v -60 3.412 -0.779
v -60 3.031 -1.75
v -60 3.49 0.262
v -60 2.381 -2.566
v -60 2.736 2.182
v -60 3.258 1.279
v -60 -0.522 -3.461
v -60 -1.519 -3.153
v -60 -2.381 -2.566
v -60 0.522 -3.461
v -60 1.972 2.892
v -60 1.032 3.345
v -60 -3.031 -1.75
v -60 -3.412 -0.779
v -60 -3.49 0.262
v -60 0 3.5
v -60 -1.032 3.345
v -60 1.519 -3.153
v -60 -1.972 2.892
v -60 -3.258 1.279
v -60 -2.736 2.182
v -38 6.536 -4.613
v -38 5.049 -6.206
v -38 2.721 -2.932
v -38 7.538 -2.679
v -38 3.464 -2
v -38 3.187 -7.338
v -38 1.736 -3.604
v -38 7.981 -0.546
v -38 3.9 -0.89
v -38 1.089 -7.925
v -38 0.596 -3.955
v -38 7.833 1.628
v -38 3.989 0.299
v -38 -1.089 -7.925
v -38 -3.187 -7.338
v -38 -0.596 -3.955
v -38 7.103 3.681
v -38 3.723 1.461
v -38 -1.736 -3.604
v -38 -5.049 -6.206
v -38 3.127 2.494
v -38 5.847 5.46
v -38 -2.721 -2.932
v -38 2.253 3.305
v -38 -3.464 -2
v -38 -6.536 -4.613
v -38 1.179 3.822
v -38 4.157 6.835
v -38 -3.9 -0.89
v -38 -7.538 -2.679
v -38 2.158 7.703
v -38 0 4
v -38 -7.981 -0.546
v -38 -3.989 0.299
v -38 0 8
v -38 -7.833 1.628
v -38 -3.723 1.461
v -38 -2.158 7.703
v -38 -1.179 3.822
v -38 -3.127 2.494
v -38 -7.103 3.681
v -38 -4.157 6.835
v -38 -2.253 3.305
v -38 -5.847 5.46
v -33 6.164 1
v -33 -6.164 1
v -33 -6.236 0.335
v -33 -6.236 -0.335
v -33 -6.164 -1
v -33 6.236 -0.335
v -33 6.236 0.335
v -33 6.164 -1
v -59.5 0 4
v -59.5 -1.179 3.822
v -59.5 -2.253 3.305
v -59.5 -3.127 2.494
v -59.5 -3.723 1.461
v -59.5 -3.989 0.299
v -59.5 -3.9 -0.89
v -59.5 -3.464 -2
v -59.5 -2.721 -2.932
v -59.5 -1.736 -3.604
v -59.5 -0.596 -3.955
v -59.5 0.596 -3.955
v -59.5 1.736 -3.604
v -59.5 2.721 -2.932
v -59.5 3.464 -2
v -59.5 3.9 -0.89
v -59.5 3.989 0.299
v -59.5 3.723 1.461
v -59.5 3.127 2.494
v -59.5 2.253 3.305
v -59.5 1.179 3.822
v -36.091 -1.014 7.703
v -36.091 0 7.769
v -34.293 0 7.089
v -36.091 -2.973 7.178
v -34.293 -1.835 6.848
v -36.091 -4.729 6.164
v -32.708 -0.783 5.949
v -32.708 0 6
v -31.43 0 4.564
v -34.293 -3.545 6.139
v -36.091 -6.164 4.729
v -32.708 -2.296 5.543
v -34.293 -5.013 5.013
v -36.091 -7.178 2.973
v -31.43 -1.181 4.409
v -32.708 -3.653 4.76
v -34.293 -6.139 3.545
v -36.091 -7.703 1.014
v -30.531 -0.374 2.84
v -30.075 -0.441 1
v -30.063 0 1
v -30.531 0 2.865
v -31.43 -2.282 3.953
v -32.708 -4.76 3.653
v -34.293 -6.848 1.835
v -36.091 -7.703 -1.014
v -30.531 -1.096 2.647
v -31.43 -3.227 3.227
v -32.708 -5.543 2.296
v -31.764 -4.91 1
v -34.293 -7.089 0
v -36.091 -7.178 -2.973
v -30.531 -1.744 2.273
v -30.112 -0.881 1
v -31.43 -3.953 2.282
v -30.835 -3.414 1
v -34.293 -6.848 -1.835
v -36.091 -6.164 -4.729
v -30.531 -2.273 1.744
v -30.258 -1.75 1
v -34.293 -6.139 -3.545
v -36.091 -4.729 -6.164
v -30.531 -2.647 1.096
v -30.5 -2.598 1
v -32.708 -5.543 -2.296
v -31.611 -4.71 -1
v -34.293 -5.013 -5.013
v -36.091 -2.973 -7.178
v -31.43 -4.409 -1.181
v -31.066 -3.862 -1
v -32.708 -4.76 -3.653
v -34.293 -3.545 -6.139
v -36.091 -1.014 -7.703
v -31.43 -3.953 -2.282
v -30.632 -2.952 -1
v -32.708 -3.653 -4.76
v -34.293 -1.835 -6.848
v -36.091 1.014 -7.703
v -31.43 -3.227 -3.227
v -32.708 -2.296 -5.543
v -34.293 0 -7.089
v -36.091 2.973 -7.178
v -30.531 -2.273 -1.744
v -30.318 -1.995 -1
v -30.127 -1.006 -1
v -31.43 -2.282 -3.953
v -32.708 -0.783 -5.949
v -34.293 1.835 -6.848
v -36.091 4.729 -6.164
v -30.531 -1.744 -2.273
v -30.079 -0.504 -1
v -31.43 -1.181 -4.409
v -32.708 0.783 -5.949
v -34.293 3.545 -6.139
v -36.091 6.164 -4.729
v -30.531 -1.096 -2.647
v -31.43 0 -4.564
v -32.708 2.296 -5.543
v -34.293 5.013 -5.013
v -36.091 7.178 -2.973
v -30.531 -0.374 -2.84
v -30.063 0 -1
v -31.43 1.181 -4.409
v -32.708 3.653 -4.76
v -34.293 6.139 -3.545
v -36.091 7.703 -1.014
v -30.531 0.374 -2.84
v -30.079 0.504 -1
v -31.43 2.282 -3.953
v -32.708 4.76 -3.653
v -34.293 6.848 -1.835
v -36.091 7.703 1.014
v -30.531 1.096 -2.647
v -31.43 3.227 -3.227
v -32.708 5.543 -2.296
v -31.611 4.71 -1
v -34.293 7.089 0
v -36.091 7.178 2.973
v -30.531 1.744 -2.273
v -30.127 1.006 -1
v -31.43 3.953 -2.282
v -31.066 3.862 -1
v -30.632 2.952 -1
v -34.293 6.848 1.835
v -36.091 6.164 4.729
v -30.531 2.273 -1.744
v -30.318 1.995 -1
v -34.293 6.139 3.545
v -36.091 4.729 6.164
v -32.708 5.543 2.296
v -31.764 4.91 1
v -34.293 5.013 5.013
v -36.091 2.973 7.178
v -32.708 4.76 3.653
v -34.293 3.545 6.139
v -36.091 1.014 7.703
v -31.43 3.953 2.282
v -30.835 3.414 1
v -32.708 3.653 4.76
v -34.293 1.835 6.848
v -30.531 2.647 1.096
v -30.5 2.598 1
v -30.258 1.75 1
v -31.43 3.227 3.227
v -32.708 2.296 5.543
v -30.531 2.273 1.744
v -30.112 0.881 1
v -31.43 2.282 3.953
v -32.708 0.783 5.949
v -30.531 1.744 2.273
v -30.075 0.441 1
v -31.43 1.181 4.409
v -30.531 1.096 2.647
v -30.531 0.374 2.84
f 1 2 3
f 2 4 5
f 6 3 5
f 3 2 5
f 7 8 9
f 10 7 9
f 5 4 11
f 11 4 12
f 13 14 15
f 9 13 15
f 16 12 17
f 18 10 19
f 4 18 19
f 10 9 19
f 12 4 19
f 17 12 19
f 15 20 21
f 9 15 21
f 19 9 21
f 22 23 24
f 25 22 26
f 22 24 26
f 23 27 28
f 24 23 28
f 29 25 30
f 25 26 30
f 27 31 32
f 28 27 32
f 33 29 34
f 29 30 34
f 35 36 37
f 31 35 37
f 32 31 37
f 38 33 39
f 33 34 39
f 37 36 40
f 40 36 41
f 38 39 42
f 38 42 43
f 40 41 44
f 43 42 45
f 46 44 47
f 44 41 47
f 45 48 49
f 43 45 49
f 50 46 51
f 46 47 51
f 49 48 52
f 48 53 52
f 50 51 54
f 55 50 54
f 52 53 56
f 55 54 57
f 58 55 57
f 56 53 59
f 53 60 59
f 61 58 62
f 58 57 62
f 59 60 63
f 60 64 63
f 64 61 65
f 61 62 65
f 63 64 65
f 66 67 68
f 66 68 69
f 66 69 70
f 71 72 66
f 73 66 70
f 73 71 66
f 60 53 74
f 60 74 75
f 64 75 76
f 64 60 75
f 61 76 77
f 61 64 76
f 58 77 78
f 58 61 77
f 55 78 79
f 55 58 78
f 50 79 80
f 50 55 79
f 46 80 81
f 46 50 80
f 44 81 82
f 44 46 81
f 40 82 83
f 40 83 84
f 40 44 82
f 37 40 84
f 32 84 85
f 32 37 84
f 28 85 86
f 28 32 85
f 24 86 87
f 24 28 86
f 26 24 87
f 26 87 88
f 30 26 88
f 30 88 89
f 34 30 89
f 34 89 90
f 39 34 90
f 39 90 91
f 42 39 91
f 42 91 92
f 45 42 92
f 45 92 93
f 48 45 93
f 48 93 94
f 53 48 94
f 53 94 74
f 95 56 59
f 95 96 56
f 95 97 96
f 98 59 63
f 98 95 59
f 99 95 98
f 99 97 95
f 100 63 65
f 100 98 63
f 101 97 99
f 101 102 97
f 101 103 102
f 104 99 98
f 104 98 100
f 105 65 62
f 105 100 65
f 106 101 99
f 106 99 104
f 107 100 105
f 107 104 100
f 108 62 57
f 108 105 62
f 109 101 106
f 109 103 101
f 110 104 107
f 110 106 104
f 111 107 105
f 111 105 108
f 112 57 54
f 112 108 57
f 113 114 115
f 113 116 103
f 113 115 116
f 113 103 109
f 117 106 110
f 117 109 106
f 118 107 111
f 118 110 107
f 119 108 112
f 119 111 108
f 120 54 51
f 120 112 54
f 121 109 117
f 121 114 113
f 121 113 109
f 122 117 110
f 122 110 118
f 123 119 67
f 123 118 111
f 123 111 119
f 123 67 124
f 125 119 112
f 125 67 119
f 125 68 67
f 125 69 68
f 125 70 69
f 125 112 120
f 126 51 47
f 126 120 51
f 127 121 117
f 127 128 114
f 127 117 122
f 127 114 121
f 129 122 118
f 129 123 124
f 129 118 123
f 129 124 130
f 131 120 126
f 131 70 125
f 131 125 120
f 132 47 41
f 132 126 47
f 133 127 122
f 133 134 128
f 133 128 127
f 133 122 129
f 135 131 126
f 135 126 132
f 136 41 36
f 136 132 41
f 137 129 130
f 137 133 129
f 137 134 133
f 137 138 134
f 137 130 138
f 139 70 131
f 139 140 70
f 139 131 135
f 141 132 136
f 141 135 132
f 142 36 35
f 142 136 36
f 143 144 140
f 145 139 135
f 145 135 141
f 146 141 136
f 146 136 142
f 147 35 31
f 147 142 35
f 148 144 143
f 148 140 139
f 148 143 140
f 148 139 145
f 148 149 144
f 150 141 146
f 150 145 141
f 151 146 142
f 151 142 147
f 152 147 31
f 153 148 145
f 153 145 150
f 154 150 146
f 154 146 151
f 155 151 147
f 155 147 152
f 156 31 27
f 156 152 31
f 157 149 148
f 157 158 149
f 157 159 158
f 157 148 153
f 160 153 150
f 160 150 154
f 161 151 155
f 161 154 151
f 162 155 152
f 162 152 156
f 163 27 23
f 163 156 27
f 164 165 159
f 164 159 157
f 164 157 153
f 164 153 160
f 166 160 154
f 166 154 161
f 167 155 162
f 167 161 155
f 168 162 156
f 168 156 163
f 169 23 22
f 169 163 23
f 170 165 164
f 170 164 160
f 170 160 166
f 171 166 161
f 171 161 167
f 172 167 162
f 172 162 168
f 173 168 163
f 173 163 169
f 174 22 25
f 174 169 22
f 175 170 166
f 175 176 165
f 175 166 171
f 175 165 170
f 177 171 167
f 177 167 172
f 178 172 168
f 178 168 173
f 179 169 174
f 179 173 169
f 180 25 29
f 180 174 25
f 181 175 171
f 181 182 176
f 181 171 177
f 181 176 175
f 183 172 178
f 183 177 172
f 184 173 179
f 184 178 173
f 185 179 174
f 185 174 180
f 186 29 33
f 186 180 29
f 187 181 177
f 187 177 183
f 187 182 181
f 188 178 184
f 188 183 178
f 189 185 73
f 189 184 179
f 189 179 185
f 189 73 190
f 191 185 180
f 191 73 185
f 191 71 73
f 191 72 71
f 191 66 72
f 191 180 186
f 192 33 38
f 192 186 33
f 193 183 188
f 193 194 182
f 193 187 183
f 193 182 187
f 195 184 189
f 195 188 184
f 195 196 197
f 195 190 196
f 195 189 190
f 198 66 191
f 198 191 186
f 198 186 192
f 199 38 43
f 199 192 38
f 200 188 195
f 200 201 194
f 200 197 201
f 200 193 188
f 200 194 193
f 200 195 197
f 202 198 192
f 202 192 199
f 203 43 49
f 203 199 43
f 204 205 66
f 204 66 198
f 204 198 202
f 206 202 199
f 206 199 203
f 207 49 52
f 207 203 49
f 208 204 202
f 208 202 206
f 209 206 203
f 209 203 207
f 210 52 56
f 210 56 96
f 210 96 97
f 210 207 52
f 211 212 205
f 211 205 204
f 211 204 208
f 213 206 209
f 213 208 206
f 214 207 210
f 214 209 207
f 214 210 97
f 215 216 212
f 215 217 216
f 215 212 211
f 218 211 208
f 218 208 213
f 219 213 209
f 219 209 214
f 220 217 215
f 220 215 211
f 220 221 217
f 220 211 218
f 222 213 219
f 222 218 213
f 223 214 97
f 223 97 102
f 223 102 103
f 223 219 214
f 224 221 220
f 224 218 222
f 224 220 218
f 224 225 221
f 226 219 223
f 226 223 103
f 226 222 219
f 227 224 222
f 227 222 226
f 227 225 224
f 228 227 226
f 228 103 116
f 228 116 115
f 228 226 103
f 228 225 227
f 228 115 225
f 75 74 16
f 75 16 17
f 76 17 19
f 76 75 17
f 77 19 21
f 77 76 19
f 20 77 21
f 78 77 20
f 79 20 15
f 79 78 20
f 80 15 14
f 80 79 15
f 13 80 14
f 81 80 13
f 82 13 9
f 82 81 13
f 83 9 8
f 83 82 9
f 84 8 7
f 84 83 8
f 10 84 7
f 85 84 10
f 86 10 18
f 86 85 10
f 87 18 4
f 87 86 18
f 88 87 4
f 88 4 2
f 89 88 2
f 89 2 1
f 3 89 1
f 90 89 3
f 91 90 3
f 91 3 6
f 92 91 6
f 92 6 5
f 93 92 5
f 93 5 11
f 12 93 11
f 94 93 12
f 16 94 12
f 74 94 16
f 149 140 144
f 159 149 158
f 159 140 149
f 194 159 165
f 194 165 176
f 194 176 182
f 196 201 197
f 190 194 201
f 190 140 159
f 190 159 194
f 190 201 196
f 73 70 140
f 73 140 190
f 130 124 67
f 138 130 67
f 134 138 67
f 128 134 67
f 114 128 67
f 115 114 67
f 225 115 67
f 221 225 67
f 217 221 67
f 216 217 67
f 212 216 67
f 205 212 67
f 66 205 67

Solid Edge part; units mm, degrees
sketch "Sketch1" plane through (0, 0, 0) normal (0, -1, 0) x (1, 0, 0)
  line L0 (-60, 4) -> (-38, 4)
  line L1 (-38, 4) -> (-38, 8)
  arc A0 (-38, 8) -> (-30, 0) centre (-38, 0) cw
  line L2 (-60, 4) -> (-60, 0)
revolve "RevolvedProtrusion1" add sketch "Sketch1" angle 360 about axis through (-60, 0, 0) along (1, 0, 0)
sketch "Sketch2" plane through (0, 0, 0) normal (0, -1, 0) x (1, 0, 0)
  line L0 (-33, -1) -> (-30, -1)
  line L1 (-30, -1) -> (-30, 1)
  line L2 (-30, 1) -> (-33, 1)
  line L3 (-33, 1) -> (-33, -1)
extrude "Cutout1" cut sketch "Sketch2" along normal mid plane 74.7625
cosmetic_thread "Thread1" size "M8"
chamfer "Chamfer_1" distance 0.5 angle 45 1 edges at (-60, 0, -4)
